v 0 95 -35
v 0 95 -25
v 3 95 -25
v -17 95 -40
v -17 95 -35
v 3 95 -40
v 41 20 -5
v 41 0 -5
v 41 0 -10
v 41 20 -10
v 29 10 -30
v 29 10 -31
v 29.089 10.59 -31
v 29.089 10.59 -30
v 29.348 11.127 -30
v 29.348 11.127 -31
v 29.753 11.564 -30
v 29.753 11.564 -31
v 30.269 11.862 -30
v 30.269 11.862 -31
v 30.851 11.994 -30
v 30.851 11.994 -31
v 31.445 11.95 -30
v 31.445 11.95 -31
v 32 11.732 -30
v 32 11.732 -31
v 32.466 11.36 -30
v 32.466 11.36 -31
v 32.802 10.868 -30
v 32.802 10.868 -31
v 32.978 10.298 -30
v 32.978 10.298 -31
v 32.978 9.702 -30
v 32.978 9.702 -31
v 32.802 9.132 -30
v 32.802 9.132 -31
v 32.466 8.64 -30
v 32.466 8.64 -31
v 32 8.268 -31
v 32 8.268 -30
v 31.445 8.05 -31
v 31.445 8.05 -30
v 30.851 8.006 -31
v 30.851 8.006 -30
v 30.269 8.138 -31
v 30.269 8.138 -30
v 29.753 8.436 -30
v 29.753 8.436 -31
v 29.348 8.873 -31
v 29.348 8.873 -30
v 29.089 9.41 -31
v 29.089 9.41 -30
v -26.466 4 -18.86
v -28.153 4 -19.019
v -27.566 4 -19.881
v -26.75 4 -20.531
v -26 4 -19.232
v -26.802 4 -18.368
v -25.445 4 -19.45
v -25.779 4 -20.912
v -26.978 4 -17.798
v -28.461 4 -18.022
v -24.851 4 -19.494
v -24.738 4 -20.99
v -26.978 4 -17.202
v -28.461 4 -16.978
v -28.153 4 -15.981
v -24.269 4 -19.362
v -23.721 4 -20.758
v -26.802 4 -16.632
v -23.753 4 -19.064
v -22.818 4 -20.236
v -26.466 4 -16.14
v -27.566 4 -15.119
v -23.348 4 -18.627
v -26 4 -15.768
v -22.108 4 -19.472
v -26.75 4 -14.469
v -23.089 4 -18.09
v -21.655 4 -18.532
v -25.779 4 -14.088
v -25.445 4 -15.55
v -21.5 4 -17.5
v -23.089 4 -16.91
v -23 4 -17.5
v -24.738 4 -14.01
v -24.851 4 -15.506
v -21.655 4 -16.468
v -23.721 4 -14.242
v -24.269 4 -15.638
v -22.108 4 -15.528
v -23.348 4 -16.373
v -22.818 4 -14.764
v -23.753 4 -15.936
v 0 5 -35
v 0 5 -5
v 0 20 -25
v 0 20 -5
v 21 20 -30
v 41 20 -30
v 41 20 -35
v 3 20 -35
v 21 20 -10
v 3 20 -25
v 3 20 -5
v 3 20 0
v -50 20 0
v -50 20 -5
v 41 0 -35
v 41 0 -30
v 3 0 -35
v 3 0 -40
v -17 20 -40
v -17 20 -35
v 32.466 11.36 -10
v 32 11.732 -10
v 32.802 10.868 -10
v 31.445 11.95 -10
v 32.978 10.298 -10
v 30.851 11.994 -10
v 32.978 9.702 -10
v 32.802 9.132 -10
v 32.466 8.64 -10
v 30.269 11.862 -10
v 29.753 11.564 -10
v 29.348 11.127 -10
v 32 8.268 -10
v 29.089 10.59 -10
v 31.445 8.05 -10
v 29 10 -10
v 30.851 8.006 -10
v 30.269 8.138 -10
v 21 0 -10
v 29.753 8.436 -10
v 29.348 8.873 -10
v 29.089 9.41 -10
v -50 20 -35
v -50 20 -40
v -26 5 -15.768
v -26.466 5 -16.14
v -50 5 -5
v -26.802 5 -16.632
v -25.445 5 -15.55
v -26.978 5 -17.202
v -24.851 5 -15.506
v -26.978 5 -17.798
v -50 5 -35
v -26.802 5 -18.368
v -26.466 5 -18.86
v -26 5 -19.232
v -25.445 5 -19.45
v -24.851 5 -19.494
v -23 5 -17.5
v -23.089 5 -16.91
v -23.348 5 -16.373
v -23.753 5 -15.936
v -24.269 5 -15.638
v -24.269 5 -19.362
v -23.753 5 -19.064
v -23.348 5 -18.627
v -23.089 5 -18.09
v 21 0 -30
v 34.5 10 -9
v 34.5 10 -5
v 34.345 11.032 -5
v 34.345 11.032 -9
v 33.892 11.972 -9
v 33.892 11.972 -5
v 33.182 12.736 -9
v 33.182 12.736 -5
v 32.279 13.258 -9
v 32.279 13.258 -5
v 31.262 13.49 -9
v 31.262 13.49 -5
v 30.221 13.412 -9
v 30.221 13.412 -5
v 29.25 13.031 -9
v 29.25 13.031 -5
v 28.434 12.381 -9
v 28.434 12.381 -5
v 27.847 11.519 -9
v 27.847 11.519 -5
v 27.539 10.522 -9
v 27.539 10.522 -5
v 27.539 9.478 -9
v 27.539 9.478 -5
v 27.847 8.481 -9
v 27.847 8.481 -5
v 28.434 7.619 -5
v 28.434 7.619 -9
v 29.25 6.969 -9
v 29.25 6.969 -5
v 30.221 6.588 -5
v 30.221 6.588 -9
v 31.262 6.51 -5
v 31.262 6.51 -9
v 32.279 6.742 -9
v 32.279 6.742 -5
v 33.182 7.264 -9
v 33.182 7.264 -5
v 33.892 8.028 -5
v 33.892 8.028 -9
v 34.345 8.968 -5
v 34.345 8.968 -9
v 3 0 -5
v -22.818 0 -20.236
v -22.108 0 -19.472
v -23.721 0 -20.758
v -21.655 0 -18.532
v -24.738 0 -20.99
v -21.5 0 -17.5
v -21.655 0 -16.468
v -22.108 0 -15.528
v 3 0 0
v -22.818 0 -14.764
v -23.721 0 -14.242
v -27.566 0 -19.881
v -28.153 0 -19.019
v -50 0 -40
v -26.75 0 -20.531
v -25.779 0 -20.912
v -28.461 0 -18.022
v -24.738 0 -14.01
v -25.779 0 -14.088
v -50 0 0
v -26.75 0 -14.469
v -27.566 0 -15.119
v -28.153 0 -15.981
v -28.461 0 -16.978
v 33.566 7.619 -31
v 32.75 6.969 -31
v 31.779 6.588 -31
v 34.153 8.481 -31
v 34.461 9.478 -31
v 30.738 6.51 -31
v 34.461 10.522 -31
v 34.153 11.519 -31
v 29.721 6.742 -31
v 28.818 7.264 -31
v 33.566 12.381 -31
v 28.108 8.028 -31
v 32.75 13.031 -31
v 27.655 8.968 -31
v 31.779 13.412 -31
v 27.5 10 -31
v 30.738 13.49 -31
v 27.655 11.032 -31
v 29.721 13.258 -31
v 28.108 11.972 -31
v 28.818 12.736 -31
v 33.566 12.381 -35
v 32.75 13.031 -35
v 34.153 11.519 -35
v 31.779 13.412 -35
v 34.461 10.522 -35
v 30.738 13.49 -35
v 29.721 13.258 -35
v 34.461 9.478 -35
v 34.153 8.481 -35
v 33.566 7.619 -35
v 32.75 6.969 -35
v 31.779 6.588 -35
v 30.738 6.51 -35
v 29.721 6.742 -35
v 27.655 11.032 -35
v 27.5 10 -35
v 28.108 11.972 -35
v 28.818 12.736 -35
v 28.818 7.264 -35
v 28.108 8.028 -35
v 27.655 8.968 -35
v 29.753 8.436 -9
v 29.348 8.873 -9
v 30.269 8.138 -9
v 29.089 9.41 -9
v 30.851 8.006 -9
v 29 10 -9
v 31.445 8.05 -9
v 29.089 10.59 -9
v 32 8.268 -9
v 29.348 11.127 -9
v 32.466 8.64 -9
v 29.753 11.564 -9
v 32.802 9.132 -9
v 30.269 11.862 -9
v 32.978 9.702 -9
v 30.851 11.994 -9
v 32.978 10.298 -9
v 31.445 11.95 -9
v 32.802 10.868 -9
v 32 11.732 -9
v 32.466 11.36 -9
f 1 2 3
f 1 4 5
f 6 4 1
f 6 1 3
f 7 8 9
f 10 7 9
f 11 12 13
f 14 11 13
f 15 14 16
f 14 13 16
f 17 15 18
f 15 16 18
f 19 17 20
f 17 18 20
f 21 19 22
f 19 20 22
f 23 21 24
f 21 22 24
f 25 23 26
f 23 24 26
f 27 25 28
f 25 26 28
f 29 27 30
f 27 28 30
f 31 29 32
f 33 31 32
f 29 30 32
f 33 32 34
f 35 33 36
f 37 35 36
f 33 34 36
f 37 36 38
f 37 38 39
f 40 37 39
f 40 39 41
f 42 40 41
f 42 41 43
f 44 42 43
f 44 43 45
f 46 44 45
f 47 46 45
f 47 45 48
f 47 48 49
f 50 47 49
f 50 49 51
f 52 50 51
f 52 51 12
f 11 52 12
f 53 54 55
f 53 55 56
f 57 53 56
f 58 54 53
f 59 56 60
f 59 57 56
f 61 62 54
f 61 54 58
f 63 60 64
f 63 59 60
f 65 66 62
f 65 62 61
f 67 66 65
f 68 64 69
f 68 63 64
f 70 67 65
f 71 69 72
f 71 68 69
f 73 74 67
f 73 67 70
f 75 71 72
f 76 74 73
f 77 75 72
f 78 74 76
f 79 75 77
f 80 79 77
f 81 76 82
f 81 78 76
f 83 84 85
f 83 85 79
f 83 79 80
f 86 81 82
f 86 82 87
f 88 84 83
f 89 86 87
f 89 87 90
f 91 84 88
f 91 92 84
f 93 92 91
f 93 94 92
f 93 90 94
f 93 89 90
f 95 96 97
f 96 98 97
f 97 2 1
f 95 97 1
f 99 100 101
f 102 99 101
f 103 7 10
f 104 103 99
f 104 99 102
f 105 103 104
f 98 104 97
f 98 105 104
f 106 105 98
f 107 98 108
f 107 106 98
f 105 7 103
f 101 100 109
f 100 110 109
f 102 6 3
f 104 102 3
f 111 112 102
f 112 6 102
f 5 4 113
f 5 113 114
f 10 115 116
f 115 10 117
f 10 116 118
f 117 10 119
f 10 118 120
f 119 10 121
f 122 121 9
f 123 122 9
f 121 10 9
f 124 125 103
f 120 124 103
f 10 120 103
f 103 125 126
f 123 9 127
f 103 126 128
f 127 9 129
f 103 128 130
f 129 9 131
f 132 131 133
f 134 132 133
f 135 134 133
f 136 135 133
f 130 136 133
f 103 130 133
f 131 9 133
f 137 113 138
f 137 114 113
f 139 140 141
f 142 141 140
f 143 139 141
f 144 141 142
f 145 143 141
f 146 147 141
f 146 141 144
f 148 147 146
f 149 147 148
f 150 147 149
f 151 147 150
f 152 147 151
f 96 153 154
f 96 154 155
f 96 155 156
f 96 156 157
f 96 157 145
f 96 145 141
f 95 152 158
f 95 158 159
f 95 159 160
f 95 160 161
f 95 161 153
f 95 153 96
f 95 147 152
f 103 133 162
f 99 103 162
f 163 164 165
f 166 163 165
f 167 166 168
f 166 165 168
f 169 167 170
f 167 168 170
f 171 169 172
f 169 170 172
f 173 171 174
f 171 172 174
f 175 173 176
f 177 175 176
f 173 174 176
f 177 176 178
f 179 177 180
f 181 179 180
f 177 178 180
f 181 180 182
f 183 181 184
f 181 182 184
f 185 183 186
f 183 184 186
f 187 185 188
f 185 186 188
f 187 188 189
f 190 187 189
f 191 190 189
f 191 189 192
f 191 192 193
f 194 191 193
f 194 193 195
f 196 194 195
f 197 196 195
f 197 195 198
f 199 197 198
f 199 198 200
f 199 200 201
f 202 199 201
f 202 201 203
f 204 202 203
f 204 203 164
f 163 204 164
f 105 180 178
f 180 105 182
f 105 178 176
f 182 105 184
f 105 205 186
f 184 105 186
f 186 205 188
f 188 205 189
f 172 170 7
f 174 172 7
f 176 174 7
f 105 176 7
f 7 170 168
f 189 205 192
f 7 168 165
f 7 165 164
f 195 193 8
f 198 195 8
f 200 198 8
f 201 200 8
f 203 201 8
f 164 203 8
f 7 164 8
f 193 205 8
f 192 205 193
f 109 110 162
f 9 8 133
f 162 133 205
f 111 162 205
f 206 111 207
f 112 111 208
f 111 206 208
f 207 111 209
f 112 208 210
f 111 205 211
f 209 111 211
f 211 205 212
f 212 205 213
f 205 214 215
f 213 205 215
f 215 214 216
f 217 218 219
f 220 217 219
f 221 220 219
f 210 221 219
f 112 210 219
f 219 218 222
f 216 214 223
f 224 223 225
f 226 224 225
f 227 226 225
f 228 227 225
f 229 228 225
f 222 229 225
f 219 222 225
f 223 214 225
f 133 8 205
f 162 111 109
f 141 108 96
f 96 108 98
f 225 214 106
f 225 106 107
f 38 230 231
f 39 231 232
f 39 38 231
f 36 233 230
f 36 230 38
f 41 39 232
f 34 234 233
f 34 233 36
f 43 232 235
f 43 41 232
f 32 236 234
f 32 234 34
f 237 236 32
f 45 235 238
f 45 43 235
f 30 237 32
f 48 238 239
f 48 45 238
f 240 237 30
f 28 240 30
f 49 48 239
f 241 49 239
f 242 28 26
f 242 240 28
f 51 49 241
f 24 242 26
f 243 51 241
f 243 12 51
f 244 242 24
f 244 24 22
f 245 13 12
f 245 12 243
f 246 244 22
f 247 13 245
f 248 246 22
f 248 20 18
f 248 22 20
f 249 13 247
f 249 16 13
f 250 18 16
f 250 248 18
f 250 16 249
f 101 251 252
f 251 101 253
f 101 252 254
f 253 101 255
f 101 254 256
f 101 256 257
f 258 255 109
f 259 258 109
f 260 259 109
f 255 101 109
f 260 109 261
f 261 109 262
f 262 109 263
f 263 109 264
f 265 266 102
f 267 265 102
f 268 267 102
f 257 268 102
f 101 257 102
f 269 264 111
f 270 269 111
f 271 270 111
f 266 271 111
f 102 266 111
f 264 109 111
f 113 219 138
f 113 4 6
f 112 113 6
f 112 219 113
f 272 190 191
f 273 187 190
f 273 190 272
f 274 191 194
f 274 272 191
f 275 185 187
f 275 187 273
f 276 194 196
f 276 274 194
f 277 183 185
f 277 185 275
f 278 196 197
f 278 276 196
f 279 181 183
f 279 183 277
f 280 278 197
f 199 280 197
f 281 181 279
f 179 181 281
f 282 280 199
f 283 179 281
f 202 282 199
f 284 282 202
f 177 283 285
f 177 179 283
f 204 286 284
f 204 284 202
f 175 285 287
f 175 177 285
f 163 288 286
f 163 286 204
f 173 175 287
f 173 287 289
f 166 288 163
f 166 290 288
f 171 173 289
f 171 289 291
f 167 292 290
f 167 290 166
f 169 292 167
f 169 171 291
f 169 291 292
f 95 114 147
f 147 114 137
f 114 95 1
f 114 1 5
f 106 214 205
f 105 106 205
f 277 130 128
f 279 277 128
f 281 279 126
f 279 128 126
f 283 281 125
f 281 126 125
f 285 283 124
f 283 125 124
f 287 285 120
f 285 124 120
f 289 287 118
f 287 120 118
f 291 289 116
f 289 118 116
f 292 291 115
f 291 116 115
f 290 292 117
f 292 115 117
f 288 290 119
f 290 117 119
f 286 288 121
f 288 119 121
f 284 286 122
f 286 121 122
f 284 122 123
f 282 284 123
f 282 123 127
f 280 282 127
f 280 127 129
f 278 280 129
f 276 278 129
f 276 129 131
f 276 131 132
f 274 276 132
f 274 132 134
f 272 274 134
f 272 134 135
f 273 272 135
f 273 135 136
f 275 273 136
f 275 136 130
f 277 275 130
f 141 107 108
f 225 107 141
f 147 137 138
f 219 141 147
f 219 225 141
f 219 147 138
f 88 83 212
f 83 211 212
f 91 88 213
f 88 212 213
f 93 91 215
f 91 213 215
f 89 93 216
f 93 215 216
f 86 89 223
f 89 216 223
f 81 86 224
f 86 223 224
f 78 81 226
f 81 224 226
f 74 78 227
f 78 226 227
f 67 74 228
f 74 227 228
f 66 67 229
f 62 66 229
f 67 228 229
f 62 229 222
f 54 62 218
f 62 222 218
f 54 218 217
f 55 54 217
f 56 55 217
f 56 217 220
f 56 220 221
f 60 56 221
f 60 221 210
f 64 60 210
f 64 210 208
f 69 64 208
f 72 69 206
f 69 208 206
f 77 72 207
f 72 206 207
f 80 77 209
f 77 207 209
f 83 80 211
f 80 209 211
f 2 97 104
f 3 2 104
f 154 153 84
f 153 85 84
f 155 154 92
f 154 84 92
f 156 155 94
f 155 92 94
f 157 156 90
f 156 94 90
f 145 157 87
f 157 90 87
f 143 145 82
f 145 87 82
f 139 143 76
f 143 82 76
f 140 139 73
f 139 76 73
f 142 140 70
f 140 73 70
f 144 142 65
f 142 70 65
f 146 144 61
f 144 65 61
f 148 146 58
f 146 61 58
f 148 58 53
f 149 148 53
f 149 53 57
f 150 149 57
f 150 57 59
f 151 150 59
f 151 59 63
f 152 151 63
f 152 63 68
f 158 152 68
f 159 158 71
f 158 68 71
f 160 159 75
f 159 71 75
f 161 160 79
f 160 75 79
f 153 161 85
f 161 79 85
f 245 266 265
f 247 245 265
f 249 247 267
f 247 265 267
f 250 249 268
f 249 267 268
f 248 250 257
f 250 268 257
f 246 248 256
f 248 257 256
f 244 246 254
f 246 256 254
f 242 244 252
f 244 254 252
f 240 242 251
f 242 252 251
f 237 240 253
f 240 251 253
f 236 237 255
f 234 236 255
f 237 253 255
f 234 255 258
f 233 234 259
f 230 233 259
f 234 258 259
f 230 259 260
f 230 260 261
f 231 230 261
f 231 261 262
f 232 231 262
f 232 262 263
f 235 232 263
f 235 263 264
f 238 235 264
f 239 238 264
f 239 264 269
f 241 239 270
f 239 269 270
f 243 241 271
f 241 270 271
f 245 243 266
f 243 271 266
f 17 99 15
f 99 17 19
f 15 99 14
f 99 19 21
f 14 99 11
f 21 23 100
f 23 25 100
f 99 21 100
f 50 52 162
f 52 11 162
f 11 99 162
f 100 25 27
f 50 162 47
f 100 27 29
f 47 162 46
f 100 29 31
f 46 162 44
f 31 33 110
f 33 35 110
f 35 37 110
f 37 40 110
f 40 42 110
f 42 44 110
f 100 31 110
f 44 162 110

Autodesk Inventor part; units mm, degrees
ref_plane "YZ Plane" through (0, 0, 0) normal (1, 0, 0) x (0, 1, 0)
ref_plane "XZ Plane" through (0, 0, 0) normal (0, 1, 0) x (-1, 0, 0)
ref_plane "XY Plane" through (0, 0, 0) normal (0, 0, 1) x (1, 0, 0)
sketch "Sketch1" plane through (0, 0, 0) normal (0, 1, 0) x (-1, 0, 0)
  line L0 (0, 0) -> (50, 0)
  line L1 (50, 0) -> (50, -40)
  line L2 (50, -40) -> (0, -40)
  line L3 (0, -40) -> (0, 0)
  line L4 (0, -5) -> (-41, -5)
  line L5 (-41, -5) -> (-41, -10)
  line L6 (-41, -10) -> (0, -10)
  line L7 (0, -10) -> (0, -5)
  line L8 (0, -30) -> (-41, -30)
  line L9 (-41, -30) -> (-41, -35)
  line L10 (-41, -35) -> (0, -35)
  line L11 (0, -35) -> (0, -30)
  line L12 (0, 0) -> (-3, 0)
  line L13 (-3, 0) -> (-3, -5)
  line L14 (-3, -5) -> (0, -5)
  line L15 (0, -5) -> (0, 0)
  line L16 (0, -40) -> (-3, -40)
  line L17 (-3, -40) -> (-3, -35)
  line L18 (-3, -35) -> (0, -35)
  line L19 (0, -35) -> (0, -40)
  line L20 (0, -10) -> (-21, -10)
  line L21 (-21, -10) -> (-21, -30)
  line L22 (-21, -30) -> (0, -30)
  line L23 (0, -30) -> (0, -10)
  point P0 (0, -10)
  point P1 (-21, -10)
  dimension "d0" = 50
  dimension "d1" = 40
  dimension "d2" = 41
  dimension "d3" = 41
  dimension "d4" = 5
  dimension "d5" = 5
  dimension "d6" = 5
  dimension "d7" = 5
  dimension "d8" = 3
  dimension "d9" = 5
  dimension "d39" = 21
extrude "Extrusion1" add sketch "Sketch1" along normal blind 20
sketch "Sketch2" plane through (0, 20, 0) normal (0, 1, 0) x (1, 0, 0)
  line L0 (-50, 40) -> (-50, 0) projected
  line L1 (-50, 5) -> (0, 5)
  line L2 (0, 5) -> (0, 35)
  line L3 (0, 35) -> (-50, 35)
  line L4 (-50, 35) -> (-50, 5)
  line L5 (3, 40) -> (-50, 40) projected
  point P0 (0, 0)
  point P1 (-50, 35)
  dimension "d12" = 50
  dimension "d13" = 30
  dimension "d26" = 5
extrude "Extrusion2" cut sketch "Sketch2" against normal blind 15
sketch "Sketch3" plane through (3, 0, -5) normal (0, 0, 1) x (1, 0, 0)
  circle A0 centre (28, 10) radius 3.5
  line L0 (38, 0) -> (38, 20) projected
  line L1 (0, 20) -> (38, 20) projected
  point P0 (-3, 0)
  point P1 (19, 20)
  dimension "d16" = 10
  dimension "d17" = 10
  dimension "d20" = 7
extrude "Extrusion3" cut sketch "Sketch3" against normal blind 4
sketch "Sketch4" plane through (41, 0, -35) normal (0, 0, -1) x (-1, 0, 0)
  circle A0 centre (10, 10) radius 3.5 projected
  circle A1 centre (10, 10) radius 3.5 projected
  point P0 (41, 0)
extrude "Extrusion4" cut sketch "Sketch4" against normal blind 4
sketch "Sketch5" plane through (31, 10, -31) normal (0, 0, -1) x (-1, 0, 0)
  circle A0 centre (0, 0) radius 2
  point P0 (31, -10)
  dimension "d23" = 4
extrude "Extrusion5" cut sketch "Sketch5" against normal through all
sketch "Sketch6" plane through (0, 0, 0) normal (0, -1, 0) x (1, 0, 0)
  circle A0 centre (-25, -17.5) radius 3.5
  line L0 (0, -5) -> (-50, -5) projected
  point P0 (0, 0)
  point P1 (-50, -35)
  point P2 (0, -35)
  dimension "d27" = 7
  dimension "d29" = 25
  dimension "d44" = 12.5
extrude "Extrusion6" cut sketch "Sketch6" against normal blind 4
sketch "Sketch7" plane through (-25, 4, -17.5) normal (0, -1, 0) x (1, 0, 0)
  circle A0 centre (0, 0) radius 2
  point P0 (25, 17.5)
  dimension "d32" = 4
extrude "Extrusion7" cut sketch "Sketch7" against normal blind 4
sketch "Sketch9" plane through (0, 20, 0) normal (0, 1, 0) x (1, 0, 0)
  line L0 (3, 35) -> (3, 40) projected
  line L1 (-50, 35) -> (0, 35) projected
  line L2 (3, 40) -> (-17, 40)
  line L3 (-17, 40) -> (-17, 35)
  line L4 (-17, 35) -> (3, 35)
  line L5 (3, 35) -> (3, 40)
  line L6 (0, 35) -> (0, 5) projected
  line L7 (3, 35) -> (0, 35)
  line L8 (0, 35) -> (0, 25)
  line L9 (0, 25) -> (3, 25)
  line L10 (3, 25) -> (3, 35)
  point P0 (0, 0)
  point P1 (0, 15)
  dimension "d40" = 20
  dimension "d41" = 10
extrude "Extrusion9" add sketch "Sketch9" along normal blind 75
properties part number "PowerSupplyAttachTop"
